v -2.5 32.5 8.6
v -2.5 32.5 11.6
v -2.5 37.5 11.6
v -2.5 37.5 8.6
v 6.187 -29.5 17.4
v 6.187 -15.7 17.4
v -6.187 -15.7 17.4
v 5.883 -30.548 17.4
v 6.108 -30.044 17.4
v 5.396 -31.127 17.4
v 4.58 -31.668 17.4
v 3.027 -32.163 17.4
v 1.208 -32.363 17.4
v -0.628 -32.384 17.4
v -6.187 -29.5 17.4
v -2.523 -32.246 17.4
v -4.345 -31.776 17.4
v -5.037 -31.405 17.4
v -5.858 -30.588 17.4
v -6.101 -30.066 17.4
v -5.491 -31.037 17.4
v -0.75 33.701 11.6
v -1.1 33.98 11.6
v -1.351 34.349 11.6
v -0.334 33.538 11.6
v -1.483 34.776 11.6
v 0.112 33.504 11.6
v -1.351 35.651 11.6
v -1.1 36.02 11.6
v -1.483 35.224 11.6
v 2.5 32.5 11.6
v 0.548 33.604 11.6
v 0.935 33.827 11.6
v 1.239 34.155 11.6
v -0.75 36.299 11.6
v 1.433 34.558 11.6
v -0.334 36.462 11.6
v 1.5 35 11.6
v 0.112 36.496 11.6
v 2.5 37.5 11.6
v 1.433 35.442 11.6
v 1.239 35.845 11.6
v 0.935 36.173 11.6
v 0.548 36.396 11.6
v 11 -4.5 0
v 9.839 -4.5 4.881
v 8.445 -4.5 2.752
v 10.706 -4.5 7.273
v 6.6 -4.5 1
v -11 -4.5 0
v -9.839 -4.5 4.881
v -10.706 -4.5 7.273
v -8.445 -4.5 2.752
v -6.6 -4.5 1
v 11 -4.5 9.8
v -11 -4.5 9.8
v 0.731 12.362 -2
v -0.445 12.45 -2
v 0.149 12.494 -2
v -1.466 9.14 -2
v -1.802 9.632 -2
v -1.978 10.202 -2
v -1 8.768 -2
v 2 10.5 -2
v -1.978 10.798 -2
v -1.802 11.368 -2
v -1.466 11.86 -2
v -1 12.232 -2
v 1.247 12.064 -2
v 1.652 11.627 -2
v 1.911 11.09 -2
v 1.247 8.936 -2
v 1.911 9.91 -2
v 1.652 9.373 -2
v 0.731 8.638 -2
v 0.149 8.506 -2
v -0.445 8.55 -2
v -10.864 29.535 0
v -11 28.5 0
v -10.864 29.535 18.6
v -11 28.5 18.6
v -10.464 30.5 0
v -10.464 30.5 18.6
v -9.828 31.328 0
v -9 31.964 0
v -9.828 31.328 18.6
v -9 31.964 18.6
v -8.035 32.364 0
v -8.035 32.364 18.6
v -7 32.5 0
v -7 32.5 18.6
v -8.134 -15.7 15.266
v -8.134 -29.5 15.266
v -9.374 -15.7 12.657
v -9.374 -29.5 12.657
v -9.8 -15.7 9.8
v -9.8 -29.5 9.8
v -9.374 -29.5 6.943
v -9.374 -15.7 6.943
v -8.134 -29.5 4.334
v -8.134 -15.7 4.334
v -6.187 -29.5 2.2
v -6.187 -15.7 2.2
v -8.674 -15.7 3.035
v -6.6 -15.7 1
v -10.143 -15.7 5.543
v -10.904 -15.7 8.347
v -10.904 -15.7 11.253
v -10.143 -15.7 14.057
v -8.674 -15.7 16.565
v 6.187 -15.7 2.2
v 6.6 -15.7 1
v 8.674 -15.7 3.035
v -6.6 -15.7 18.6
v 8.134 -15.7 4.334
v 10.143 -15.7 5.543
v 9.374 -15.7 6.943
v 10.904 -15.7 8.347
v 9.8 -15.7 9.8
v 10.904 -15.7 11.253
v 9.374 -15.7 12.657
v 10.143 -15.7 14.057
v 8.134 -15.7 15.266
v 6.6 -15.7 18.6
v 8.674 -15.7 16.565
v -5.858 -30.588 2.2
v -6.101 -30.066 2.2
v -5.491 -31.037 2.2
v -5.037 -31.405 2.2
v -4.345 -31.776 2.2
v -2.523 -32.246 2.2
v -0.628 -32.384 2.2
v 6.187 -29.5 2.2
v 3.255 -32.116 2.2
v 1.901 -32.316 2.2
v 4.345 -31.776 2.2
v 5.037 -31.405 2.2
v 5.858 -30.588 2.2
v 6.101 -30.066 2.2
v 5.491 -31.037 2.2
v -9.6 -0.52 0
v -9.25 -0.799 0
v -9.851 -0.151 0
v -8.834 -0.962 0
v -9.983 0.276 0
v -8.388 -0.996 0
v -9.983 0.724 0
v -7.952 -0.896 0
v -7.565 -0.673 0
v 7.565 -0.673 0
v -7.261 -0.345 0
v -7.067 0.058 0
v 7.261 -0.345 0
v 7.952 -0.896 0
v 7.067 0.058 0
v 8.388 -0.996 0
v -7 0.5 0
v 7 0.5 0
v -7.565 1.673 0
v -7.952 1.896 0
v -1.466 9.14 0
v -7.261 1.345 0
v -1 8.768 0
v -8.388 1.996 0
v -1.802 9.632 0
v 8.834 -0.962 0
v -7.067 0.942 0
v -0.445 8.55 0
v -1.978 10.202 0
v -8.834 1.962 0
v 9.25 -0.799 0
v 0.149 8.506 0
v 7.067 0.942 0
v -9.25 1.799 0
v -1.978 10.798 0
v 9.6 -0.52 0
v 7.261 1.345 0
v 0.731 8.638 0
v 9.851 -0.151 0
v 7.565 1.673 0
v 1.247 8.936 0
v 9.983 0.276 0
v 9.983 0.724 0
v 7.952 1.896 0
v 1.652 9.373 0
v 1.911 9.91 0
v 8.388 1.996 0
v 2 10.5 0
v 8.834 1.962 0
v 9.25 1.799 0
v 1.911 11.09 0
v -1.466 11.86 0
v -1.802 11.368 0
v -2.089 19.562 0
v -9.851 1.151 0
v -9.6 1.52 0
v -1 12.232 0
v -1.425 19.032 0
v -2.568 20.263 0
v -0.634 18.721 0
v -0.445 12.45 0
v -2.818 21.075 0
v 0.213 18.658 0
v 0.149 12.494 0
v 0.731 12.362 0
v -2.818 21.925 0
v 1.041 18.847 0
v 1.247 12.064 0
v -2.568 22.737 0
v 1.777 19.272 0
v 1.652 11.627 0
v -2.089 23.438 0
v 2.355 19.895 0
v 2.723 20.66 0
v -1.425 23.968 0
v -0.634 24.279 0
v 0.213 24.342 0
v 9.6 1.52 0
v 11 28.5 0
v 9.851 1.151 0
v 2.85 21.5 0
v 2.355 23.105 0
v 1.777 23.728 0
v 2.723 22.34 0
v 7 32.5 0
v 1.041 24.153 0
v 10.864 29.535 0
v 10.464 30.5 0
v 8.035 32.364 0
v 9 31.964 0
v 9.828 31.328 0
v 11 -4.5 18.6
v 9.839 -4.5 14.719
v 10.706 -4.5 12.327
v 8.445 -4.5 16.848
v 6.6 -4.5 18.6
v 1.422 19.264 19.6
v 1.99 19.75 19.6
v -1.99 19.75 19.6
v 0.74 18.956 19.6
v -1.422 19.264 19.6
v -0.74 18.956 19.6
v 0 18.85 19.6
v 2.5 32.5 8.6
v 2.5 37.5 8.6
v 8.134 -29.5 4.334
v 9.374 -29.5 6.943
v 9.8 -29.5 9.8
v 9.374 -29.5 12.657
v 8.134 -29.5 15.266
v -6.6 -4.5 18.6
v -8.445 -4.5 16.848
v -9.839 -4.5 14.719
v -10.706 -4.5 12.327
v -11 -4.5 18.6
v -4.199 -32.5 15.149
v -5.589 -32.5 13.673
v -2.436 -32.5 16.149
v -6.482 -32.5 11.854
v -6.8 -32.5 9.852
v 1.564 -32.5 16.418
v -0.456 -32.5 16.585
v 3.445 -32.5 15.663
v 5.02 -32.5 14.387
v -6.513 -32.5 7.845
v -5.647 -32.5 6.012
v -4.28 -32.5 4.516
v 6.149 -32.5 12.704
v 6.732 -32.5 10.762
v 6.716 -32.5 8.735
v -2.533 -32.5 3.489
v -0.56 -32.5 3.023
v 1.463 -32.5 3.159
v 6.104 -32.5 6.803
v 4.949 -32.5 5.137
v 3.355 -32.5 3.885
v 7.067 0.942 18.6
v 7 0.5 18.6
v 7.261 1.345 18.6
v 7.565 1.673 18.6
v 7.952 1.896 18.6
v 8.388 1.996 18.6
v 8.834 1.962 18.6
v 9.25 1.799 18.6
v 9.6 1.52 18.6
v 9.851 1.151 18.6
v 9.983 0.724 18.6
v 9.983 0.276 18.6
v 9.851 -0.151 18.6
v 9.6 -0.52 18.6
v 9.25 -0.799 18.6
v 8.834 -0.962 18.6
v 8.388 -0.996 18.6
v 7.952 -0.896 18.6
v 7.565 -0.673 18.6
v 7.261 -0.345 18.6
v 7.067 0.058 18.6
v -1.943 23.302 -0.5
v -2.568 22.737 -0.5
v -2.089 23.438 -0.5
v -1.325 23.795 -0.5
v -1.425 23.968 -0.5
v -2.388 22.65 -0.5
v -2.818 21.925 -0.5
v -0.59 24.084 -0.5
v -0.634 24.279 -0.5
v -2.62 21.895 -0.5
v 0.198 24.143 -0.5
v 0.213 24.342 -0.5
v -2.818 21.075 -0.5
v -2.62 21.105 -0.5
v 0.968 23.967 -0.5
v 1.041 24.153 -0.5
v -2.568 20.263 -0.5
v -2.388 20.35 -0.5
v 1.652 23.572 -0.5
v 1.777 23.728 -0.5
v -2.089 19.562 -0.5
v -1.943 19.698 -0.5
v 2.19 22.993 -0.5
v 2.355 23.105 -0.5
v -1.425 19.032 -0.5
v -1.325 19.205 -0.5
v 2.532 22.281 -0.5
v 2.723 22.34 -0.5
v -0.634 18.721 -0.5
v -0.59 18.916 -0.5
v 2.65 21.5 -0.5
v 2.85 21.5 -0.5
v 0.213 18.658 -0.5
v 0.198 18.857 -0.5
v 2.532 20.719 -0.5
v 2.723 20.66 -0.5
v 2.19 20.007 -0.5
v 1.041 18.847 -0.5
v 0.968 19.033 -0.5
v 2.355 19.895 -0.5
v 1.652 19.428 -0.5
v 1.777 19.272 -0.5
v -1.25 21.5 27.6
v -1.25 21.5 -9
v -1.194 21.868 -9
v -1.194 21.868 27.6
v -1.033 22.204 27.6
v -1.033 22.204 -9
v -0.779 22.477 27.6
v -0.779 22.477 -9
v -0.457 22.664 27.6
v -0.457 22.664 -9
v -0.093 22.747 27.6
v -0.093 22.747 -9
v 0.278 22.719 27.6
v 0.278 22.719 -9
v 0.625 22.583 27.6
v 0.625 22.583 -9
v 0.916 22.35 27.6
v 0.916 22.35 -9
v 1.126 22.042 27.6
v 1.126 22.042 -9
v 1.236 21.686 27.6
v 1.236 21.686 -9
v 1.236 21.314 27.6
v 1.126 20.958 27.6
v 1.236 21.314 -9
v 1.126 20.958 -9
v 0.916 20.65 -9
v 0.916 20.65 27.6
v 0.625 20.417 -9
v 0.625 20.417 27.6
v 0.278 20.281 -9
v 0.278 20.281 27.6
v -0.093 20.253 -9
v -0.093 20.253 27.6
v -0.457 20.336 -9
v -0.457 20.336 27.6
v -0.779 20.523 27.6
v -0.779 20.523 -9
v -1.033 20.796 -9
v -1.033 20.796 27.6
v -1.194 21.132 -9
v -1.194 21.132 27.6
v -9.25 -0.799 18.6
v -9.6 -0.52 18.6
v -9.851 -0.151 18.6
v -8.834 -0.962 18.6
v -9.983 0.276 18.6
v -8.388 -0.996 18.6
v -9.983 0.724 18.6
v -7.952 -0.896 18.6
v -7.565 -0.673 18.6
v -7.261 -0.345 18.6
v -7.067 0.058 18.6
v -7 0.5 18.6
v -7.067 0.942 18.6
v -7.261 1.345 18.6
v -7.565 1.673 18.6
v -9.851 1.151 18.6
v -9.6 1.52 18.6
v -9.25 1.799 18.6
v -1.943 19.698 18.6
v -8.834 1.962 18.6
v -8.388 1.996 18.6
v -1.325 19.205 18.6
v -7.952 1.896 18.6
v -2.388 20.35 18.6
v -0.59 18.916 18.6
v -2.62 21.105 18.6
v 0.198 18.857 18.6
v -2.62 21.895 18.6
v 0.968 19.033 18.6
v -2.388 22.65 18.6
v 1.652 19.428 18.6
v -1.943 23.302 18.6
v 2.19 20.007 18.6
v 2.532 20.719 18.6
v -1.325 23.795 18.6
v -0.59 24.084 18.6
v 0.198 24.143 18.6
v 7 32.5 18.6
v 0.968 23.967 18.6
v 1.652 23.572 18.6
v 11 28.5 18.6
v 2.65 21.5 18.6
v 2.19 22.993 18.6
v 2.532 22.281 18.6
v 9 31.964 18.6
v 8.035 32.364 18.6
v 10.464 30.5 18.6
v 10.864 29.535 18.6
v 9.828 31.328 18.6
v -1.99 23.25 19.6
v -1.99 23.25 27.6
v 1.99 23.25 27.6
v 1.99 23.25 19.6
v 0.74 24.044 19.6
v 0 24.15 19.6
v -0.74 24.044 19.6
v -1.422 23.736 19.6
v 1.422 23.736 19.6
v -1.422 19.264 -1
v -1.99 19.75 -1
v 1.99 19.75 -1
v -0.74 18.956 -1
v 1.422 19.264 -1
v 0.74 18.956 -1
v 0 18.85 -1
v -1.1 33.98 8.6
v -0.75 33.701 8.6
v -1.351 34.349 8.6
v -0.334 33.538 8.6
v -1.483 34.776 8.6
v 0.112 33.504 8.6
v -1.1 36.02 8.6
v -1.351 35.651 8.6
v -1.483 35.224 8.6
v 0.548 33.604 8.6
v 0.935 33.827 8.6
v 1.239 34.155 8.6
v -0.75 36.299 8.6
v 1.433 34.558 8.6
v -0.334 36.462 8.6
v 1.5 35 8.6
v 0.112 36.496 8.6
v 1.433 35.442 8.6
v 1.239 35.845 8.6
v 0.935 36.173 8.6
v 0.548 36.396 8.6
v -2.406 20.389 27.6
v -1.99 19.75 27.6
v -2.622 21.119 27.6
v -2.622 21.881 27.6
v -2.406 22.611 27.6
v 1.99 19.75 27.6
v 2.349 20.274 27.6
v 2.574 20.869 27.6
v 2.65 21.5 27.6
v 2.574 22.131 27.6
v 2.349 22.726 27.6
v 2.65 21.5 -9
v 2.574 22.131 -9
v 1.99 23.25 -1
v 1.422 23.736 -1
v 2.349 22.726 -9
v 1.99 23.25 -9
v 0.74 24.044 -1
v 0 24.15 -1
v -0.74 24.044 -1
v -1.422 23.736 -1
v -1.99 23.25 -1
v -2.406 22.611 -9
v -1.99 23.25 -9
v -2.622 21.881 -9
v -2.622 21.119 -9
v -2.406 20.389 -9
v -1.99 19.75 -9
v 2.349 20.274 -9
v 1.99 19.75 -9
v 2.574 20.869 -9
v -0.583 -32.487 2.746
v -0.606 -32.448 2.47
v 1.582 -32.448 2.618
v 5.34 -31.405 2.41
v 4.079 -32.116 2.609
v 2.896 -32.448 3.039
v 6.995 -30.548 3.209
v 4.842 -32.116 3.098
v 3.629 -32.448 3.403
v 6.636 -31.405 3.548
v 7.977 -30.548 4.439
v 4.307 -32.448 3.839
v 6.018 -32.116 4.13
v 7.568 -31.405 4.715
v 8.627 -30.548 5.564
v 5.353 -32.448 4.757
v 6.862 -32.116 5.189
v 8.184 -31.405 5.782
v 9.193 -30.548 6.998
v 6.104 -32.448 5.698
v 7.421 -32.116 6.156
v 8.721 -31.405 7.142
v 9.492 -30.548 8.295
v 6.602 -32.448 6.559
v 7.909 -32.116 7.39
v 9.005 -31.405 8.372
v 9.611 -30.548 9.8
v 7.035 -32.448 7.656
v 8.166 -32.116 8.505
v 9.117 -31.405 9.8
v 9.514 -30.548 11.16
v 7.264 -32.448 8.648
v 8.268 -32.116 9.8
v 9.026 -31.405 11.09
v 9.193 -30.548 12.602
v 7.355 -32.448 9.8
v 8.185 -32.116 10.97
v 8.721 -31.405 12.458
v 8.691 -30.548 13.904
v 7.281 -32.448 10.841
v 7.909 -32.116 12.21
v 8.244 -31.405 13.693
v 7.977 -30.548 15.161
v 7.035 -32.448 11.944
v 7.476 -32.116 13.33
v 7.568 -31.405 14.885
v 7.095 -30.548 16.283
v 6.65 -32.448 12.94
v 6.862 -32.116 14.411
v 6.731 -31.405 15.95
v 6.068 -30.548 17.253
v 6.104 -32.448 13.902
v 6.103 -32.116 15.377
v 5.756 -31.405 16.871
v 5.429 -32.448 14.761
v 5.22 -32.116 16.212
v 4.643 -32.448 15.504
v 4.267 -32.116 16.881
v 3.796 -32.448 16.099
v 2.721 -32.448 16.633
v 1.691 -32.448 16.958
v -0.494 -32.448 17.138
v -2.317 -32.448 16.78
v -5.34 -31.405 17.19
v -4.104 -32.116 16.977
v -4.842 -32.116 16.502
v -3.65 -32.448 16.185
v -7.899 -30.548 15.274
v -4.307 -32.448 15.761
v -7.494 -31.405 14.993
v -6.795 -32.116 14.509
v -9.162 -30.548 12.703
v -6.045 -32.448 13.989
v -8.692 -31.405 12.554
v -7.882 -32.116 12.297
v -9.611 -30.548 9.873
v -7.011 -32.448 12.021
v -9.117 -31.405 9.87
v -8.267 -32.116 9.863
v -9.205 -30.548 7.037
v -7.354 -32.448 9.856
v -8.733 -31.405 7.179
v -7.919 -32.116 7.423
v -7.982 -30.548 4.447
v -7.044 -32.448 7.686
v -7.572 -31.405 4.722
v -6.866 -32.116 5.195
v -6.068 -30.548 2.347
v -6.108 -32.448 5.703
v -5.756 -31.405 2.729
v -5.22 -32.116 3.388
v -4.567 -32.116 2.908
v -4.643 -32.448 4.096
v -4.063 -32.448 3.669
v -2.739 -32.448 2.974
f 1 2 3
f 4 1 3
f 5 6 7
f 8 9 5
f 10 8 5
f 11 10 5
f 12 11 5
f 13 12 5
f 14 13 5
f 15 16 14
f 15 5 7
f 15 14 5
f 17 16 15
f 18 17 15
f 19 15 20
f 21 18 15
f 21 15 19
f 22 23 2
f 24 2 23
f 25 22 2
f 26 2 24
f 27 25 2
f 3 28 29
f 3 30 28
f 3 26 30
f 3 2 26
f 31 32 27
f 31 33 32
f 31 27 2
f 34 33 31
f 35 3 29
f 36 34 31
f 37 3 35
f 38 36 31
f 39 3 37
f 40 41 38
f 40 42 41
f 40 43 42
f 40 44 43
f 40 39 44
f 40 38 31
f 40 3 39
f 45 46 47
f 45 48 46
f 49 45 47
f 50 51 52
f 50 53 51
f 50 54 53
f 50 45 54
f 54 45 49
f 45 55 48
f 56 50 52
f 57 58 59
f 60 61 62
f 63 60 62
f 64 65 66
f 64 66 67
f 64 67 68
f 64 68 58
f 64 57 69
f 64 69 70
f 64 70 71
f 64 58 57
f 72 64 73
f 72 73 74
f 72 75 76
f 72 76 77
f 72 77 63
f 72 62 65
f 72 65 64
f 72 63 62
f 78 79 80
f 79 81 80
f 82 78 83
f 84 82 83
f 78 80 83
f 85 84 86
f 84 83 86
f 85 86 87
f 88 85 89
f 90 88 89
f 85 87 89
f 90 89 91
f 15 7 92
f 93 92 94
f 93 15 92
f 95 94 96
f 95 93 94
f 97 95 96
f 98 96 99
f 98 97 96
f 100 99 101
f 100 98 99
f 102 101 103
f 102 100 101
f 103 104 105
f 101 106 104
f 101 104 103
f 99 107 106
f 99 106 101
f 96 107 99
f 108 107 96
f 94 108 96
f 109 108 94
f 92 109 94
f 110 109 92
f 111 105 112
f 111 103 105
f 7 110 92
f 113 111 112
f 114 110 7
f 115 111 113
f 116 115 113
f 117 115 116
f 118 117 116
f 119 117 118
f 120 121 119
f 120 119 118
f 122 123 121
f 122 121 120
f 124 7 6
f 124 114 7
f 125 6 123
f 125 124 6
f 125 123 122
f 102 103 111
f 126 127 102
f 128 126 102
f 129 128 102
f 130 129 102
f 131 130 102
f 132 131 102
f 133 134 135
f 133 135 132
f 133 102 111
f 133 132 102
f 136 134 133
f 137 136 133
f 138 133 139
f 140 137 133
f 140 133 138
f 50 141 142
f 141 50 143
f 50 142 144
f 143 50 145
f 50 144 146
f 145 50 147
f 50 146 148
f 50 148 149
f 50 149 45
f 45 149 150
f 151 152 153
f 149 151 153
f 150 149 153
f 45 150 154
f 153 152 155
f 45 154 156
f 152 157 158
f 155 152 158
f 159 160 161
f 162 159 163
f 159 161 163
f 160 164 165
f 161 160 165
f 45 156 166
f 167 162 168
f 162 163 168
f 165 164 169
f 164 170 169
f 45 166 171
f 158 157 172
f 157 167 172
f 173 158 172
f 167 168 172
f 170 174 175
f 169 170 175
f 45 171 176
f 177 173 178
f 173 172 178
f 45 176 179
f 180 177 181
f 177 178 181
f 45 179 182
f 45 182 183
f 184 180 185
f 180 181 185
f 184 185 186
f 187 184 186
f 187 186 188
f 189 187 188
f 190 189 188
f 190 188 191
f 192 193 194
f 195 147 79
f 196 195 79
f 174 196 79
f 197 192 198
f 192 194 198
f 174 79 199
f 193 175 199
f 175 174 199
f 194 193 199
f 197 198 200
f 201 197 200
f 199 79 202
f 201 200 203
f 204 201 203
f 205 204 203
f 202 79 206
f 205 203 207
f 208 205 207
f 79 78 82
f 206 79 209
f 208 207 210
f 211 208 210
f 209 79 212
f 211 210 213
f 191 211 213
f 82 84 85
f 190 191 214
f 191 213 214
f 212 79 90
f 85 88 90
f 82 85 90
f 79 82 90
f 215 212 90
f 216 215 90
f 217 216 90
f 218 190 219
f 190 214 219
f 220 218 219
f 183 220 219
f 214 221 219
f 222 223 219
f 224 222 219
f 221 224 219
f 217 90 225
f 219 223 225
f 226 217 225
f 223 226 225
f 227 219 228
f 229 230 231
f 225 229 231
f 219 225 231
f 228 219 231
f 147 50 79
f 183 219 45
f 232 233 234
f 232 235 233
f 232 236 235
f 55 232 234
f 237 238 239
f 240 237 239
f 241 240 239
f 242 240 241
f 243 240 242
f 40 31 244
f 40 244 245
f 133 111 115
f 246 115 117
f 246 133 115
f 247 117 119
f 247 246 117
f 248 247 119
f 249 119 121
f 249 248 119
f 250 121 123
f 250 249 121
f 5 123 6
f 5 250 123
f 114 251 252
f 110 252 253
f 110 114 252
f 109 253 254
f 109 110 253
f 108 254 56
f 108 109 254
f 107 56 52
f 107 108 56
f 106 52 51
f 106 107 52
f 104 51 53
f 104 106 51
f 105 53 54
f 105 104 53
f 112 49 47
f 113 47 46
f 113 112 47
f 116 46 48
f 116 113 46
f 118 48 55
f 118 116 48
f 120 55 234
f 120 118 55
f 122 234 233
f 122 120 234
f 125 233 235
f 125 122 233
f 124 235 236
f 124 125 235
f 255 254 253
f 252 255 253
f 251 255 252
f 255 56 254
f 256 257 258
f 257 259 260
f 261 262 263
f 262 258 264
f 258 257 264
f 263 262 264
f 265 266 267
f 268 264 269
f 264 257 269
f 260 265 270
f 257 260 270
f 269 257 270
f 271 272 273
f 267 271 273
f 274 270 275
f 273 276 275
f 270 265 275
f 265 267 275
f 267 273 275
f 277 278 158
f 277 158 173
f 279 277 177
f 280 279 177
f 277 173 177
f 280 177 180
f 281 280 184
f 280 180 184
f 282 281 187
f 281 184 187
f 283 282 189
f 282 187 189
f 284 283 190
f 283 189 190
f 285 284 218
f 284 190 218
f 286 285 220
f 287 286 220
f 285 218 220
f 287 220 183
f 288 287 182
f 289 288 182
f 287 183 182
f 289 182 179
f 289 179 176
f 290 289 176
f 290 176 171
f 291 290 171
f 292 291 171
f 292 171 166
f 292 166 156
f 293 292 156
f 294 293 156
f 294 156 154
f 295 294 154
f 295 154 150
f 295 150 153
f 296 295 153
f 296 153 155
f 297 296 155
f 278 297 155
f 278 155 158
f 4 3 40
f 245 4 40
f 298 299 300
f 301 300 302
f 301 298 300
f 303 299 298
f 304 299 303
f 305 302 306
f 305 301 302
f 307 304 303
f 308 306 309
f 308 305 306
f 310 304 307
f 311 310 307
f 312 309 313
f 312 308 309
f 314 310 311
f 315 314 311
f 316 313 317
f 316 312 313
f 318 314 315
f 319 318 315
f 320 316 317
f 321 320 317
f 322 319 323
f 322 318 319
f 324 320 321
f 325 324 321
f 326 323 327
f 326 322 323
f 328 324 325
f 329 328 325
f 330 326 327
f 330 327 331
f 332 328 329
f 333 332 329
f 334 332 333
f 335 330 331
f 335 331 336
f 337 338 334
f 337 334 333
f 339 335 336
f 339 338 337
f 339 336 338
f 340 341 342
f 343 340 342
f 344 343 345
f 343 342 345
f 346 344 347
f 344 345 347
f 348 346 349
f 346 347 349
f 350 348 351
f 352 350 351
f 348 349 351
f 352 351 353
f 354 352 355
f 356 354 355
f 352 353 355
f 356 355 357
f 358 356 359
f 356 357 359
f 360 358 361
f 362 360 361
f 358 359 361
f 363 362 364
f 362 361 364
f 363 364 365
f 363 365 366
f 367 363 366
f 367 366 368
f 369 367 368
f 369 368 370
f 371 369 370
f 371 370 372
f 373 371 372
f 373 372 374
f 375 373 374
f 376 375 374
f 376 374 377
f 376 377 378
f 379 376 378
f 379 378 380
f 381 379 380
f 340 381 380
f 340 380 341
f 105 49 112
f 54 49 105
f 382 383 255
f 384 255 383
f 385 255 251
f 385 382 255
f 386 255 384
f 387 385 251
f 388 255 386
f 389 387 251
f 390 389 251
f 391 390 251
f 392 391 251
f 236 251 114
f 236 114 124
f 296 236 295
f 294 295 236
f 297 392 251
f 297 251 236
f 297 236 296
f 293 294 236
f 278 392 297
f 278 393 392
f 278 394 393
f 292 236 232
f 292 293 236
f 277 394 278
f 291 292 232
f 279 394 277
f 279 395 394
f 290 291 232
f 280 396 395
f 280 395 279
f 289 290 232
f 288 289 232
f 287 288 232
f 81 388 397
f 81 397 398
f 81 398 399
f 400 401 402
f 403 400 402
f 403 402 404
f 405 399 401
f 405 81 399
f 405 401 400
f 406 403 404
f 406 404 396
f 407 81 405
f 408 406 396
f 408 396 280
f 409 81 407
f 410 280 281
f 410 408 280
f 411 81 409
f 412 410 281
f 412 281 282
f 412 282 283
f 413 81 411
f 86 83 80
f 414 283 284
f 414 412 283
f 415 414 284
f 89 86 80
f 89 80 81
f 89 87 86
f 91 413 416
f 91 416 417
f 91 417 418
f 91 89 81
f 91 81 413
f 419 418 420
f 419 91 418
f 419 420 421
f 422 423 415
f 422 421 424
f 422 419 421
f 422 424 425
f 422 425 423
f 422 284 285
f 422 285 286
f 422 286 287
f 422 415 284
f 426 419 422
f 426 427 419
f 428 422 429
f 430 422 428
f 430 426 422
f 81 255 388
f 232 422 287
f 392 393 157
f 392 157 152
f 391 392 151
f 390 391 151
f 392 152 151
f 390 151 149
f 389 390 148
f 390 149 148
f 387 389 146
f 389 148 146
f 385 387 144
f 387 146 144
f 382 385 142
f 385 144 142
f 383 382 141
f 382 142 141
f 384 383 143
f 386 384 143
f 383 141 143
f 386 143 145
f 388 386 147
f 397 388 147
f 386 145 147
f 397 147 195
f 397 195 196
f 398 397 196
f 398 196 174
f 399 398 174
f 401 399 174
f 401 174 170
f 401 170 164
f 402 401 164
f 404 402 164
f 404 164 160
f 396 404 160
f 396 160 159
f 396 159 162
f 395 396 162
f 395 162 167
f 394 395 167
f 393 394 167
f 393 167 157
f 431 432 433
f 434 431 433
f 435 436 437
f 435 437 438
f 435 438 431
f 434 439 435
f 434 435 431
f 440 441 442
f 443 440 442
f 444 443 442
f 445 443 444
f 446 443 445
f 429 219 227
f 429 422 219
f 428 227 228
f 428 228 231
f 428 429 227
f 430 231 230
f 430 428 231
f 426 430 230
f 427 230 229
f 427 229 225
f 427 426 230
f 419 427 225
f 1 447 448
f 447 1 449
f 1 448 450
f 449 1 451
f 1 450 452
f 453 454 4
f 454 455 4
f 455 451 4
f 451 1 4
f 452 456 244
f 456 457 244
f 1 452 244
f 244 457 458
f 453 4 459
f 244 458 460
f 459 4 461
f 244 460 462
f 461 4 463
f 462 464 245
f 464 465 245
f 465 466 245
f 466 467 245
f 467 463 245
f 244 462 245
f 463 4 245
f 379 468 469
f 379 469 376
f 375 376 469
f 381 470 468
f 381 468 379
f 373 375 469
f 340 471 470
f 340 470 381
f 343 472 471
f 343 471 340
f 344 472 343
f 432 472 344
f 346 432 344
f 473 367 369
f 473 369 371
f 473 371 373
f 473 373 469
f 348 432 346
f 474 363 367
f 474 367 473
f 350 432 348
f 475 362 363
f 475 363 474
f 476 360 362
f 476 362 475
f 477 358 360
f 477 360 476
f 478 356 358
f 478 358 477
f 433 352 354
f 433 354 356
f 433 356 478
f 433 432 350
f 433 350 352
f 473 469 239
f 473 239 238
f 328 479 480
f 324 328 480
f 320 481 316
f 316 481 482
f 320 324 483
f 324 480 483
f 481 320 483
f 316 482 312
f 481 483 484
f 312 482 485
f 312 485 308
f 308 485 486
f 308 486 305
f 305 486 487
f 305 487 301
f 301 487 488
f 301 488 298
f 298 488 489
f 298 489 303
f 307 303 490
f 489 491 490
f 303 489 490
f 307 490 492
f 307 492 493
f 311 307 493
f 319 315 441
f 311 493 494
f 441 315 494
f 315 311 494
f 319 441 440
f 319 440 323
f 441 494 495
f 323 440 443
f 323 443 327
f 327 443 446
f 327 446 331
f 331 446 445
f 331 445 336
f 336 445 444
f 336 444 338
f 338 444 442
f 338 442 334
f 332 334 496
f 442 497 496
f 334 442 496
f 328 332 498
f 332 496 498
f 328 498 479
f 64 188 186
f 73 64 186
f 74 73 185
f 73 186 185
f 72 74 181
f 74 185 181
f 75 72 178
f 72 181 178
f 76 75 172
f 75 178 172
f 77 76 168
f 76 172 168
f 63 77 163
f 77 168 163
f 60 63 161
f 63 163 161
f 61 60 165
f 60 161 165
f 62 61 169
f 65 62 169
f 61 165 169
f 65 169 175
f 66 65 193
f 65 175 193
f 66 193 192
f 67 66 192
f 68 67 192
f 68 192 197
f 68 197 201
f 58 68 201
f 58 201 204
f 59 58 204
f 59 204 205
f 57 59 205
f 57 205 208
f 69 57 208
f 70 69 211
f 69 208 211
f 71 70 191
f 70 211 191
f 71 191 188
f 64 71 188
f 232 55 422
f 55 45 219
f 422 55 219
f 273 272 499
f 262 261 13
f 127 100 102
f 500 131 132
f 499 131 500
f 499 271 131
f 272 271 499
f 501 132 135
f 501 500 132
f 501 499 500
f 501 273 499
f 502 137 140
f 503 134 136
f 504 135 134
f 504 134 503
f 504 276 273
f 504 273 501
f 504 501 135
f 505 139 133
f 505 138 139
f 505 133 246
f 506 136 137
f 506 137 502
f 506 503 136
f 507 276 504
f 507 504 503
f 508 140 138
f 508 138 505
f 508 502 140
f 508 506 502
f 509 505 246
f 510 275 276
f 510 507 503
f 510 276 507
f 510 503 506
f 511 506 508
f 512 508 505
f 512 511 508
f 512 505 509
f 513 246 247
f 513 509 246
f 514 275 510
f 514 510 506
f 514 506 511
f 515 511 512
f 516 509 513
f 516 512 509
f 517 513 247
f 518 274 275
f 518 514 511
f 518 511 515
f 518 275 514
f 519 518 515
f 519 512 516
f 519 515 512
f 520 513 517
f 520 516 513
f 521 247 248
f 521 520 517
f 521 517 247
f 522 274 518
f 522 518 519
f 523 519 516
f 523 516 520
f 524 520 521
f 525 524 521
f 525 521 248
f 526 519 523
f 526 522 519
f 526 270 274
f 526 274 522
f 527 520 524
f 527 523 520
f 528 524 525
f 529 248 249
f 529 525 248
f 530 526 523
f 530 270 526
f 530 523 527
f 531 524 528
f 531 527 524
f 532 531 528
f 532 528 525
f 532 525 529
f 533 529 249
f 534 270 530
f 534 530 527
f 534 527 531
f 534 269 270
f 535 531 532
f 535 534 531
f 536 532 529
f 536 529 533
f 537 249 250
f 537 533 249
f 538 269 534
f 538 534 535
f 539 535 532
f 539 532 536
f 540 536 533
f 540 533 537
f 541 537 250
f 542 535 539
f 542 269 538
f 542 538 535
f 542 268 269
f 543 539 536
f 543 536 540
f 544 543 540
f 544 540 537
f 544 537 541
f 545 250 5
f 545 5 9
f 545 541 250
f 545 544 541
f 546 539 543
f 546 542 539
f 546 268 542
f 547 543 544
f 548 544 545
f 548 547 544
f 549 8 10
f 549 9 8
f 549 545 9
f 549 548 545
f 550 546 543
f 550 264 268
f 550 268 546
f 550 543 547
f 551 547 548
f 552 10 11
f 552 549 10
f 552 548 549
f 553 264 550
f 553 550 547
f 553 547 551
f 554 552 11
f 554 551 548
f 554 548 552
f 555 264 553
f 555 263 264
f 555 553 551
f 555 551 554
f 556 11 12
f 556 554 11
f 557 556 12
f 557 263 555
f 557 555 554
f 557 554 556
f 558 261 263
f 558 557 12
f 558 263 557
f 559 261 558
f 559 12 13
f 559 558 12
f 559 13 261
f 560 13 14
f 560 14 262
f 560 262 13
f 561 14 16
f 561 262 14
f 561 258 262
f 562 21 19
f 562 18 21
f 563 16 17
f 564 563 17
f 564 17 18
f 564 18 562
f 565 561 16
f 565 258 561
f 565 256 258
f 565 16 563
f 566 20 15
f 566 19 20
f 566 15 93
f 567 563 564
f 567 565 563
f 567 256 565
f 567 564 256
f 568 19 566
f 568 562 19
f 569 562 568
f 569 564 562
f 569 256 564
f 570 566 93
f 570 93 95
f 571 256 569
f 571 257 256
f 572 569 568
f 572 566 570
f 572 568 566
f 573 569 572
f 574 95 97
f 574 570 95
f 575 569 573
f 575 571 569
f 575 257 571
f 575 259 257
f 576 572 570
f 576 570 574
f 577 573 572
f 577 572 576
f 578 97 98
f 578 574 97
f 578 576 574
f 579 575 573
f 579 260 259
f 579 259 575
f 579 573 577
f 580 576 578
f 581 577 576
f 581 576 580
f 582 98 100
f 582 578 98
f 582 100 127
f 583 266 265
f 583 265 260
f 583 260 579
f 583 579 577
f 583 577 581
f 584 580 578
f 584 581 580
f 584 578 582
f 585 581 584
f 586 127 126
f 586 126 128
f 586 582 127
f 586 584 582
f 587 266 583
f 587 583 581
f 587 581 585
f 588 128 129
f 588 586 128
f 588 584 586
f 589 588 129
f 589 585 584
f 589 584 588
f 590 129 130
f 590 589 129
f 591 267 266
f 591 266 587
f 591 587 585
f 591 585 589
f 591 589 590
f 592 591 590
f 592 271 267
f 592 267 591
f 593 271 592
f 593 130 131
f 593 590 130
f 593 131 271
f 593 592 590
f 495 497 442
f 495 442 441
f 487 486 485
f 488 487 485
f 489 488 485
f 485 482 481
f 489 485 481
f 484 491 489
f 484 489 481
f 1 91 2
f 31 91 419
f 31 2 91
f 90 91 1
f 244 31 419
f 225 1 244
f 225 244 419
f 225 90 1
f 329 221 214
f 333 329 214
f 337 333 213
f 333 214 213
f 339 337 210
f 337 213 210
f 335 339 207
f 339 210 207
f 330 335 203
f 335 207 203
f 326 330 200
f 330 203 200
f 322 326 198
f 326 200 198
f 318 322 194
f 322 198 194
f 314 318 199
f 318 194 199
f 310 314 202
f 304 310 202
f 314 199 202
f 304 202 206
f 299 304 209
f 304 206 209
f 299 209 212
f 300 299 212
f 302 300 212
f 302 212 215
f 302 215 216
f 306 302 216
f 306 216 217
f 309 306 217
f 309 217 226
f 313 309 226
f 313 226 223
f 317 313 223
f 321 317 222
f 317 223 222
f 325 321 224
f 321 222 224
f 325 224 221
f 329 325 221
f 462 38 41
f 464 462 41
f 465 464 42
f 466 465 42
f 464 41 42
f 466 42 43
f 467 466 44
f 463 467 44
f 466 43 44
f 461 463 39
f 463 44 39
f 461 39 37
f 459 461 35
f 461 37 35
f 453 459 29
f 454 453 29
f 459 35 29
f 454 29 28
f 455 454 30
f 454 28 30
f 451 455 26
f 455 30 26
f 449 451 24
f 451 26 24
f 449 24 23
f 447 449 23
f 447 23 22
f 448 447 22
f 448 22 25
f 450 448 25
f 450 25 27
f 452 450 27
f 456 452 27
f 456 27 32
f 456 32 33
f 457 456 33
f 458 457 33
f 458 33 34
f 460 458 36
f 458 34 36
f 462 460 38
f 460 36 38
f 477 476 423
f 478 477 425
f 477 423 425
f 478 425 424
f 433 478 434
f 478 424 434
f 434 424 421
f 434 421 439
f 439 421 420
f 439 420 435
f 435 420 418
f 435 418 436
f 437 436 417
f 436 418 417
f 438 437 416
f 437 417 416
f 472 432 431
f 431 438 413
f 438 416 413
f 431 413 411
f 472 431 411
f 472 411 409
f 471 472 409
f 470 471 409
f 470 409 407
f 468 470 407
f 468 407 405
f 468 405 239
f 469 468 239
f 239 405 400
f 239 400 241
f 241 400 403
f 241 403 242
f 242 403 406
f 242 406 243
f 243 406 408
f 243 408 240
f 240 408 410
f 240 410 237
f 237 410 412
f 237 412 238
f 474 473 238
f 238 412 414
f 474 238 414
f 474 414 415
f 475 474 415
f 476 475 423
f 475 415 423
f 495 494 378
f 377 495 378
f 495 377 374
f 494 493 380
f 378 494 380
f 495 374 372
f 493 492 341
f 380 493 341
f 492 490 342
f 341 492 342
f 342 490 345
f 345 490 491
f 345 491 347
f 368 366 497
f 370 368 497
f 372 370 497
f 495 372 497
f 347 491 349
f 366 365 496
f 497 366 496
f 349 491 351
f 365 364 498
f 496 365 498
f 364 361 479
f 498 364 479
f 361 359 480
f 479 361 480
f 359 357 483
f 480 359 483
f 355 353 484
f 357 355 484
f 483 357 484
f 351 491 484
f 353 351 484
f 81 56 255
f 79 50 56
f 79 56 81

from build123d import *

# Parameters (mm, degrees)
SKETCH1_W                = 22
SKETCH1_H                = 65
BOSS_EXTRUDE1_DEPTH      = 18.6
FILLET1_R                = 4
BOSS_EXTRUDE2_DEPTH      = 9
BOSS_EXTRUDE2_DEPTH_BACK = 27.6
SKETCH2_R                = 2.65
CUT_EXTRUDE1_DEPTH       = 8
CUT_EXTRUDE2_DEPTH       = 8
SKETCH5_R                = 1.25
CUT_EXTRUDE3_DEPTH       = 51.16781837
BOSS_EXTRUDE3_START      = -7
SKETCH6_W                = 5
SKETCH6_H                = 10
SKETCH6_R                = 1.5
BOSS_EXTRUDE3_DEPTH      = 3
SKETCH7_R                = 2.85
SKETCH7_R_2              = 2.65
BOSS_EXTRUDE4_DEPTH      = 0.5
SKETCH8_R                = 2
BOSS_EXTRUDE5_DEPTH      = 2
SKETCH9_R                = 1.5
CUT_EXTRUDE4_DEPTH       = 48.843599363
SKETCH10_W               = 27.728887241
SKETCH10_H               = 31.632468454
CUT_EXTRUDE5_DEPTH       = 1
SKETCH11_R               = 16.996731029
SKETCH11_R_2             = 11
CUT_EXTRUDE6_DEPTH       = 28
CUT_EXTRUDE7_DEPTH       = 16.8
FILLET2_R                = 3


with BuildPart() as part:
    # Sketch1 → Boss-Extrude1 (new body)
    with BuildSketch(Plane.XY):
        Rectangle(SKETCH1_W, SKETCH1_H)
    extrude(amount=BOSS_EXTRUDE1_DEPTH)

    # Fillet1
    fillet1_edges = [part.edges().sort_by_distance(p)[0] for p in [
        (-11, 32.5, 9.3),
        (11, 32.5, 9.3),
    ]]
    fillet(fillet1_edges, radius=FILLET1_R)

    # Sketch2 → Boss-Extrude2 (add, two sides: drawn at the far end of the back side and taken through both)
    with BuildSketch(Plane.XY.offset(18.6).offset(-BOSS_EXTRUDE2_DEPTH_BACK)):
        with Locations((0, 21.5)):
            Circle(SKETCH2_R)
    extrude(amount=BOSS_EXTRUDE2_DEPTH + BOSS_EXTRUDE2_DEPTH_BACK)

    # Sketch3 → Cut-Extrude1 (cut)
    with BuildSketch(Plane.XY.offset(27.6)):
        with BuildLine():
            Line((-1.989974874, 23.25), (1.989974874, 23.25))
            ThreePointArc((1.989974874, 23.25), (0, 24.15), (-1.989974874, 23.25))
        make_face()
        with BuildLine():
            Line((-1.989974874, 19.75), (1.989974874, 19.75))
            ThreePointArc((1.989974874, 19.75), (0, 18.85), (-1.989974874, 19.75))
        make_face()
    extrude(amount=-CUT_EXTRUDE1_DEPTH, mode=Mode.SUBTRACT)

    # Sketch4 → Cut-Extrude2 (cut)
    with BuildSketch(Plane(origin=(0, 0, -9), x_dir=(-1, 0, 0), z_dir=(0, 0, -1))):
        with BuildLine():
            Line((-1.989974874, 19.75), (1.989974874, 19.75))
            ThreePointArc((1.989974874, 19.75), (0, 18.85), (-1.989974874, 19.75))
        make_face()
        with BuildLine():
            Line((1.989974874, 23.25), (-1.989974874, 23.25))
            ThreePointArc((-1.989974874, 23.25), (0, 24.15), (1.989974874, 23.25))
        make_face()
    extrude(amount=-CUT_EXTRUDE2_DEPTH, mode=Mode.SUBTRACT)

    # Sketch5 → Cut-Extrude3 (cut, through all)
    with BuildSketch(Plane(origin=(0, 0, -9), x_dir=(-1, 0, 0), z_dir=(0, 0, -1))):
        with Locations((0, 21.5)):
            Circle(SKETCH5_R)
    extrude(amount=-CUT_EXTRUDE3_DEPTH, mode=Mode.SUBTRACT)

    # Sketch6 → Boss-Extrude3 (add)
    with BuildSketch(Plane.XY.offset(18.6).offset(BOSS_EXTRUDE3_START)):
        with Locations((0, 32.5)):
            Rectangle(SKETCH6_W, SKETCH6_H)
        with Locations((0, 35)):
            Circle(SKETCH6_R, mode=Mode.SUBTRACT)
    extrude(amount=-BOSS_EXTRUDE3_DEPTH)

    # Sketch7 → Boss-Extrude4 (add)
    with BuildSketch(Plane(origin=(0, 0, 0), x_dir=(-1, 0, 0), z_dir=(0, 0, -1))):
        with Locations(Location((0, 21.5, 0), (0, 0, 180))):
            Circle(SKETCH7_R)
        with Locations(Location((0, 21.5, 0), (0, 0, 221.328658646))):
            Circle(SKETCH7_R_2, mode=Mode.SUBTRACT)
    extrude(amount=BOSS_EXTRUDE4_DEPTH)

    # Sketch8 → Boss-Extrude5 (add)
    with BuildSketch(Plane(origin=(0, 0, 0), x_dir=(-1, 0, 0), z_dir=(0, 0, -1))):
        with Locations(Location((0, 10.5, 0), (0, 0, 180))):
            Circle(SKETCH8_R)
    extrude(amount=BOSS_EXTRUDE5_DEPTH)

    # Sketch9 → Cut-Extrude4 (cut, through all)
    with BuildSketch(Plane(origin=(0, 0, 0), x_dir=(-1, 0, 0), z_dir=(0, 0, -1))):
        with Locations((-8.5, 0.5)):
            Circle(SKETCH9_R)
        with Locations(Location((8.5, 0.5, 0), (0, 0, 180))):
            Circle(SKETCH9_R)
    extrude(amount=-CUT_EXTRUDE4_DEPTH, mode=Mode.SUBTRACT)

    # Sketch10 → Cut-Extrude5 (cut)
    with BuildSketch(Plane(origin=(0, 0, 0), x_dir=(-1, 0, 0), z_dir=(0, 0, -1))):
        with Locations((0.201909374, -20.316234227)):
            Rectangle(SKETCH10_W, SKETCH10_H)
    extrude(amount=-CUT_EXTRUDE5_DEPTH, mode=Mode.SUBTRACT)

    # Sketch11 → Cut-Extrude6 (cut)
    with BuildSketch(Plane.XZ.offset(32.5)):
        with Locations((0, 9.8)):
            Circle(SKETCH11_R)
        with Locations((0, 9.8)):
            Circle(SKETCH11_R_2, mode=Mode.SUBTRACT)
    extrude(amount=-CUT_EXTRUDE6_DEPTH, mode=Mode.SUBTRACT)

    # Sketch12 → Cut-Extrude7 (cut)
    with BuildSketch(Plane.XZ.offset(32.5)):
        with BuildLine():
            Line((6.6, 18.6), (-6.6, 18.6))
            ThreePointArc((-6.6, 18.6), (-11, 9.8), (-6.6, 1))
            Line((-6.6, 1), (6.6, 1))
            ThreePointArc((6.6, 1), (11, 9.8), (6.6, 18.6))
        make_face()
        with BuildLine():
            Line((6.187083319, 17.4), (-6.187083319, 17.4))
            ThreePointArc((-6.187083319, 17.4), (-9.8, 9.8), (-6.187083319, 2.2))
            Line((-6.187083319, 2.2), (6.187083319, 2.2))
            ThreePointArc((6.187083319, 2.2), (9.8, 9.8), (6.187083319, 17.4))
        make_face(mode=Mode.SUBTRACT)
    extrude(amount=-CUT_EXTRUDE7_DEPTH, mode=Mode.SUBTRACT)

    # Fillet2
    # the kernel refuses this fillet: 3 mm, written as the material it takes off along each edge
    with BuildSketch(Plane(origin=(0, -32.5, 9.8), x_dir=(-0.08233193306434959, 0, -0.9966049632617165), z_dir=(-0.9966049632617165, 0, 0.08233193306434959))) as fillet2_piece_1:
        with BuildLine():
            CenterArc((9.8 - FILLET2_R, -FILLET2_R), FILLET2_R, 0, 90)
            Line((9.8 - FILLET2_R, 0), (9.8, 0))
            Line((9.8, 0), (9.8, -FILLET2_R))
        make_face()
    revolve(axis=Axis((0, -32.5, 9.8), (0, -1, 0)), revolution_arc=189.445235963, mode=Mode.SUBTRACT)
    with BuildSketch(Plane(origin=(0, -32.5, 9.8), x_dir=(0.08233193306435141, 0, 0.9966049632617163), z_dir=(0.9966049632617163, 0, -0.08233193306435141))) as fillet2_piece_2:
        with BuildLine():
            CenterArc((9.8 - FILLET2_R, -FILLET2_R), FILLET2_R, 0, 90)
            Line((9.8 - FILLET2_R, 0), (9.8, 0))
            Line((9.8, 0), (9.8, -FILLET2_R))
        make_face()
    revolve(axis=Axis((0, -32.5, 9.8), (0, -1, 0)), revolution_arc=189.445235963, mode=Mode.SUBTRACT)


solid = part.part
